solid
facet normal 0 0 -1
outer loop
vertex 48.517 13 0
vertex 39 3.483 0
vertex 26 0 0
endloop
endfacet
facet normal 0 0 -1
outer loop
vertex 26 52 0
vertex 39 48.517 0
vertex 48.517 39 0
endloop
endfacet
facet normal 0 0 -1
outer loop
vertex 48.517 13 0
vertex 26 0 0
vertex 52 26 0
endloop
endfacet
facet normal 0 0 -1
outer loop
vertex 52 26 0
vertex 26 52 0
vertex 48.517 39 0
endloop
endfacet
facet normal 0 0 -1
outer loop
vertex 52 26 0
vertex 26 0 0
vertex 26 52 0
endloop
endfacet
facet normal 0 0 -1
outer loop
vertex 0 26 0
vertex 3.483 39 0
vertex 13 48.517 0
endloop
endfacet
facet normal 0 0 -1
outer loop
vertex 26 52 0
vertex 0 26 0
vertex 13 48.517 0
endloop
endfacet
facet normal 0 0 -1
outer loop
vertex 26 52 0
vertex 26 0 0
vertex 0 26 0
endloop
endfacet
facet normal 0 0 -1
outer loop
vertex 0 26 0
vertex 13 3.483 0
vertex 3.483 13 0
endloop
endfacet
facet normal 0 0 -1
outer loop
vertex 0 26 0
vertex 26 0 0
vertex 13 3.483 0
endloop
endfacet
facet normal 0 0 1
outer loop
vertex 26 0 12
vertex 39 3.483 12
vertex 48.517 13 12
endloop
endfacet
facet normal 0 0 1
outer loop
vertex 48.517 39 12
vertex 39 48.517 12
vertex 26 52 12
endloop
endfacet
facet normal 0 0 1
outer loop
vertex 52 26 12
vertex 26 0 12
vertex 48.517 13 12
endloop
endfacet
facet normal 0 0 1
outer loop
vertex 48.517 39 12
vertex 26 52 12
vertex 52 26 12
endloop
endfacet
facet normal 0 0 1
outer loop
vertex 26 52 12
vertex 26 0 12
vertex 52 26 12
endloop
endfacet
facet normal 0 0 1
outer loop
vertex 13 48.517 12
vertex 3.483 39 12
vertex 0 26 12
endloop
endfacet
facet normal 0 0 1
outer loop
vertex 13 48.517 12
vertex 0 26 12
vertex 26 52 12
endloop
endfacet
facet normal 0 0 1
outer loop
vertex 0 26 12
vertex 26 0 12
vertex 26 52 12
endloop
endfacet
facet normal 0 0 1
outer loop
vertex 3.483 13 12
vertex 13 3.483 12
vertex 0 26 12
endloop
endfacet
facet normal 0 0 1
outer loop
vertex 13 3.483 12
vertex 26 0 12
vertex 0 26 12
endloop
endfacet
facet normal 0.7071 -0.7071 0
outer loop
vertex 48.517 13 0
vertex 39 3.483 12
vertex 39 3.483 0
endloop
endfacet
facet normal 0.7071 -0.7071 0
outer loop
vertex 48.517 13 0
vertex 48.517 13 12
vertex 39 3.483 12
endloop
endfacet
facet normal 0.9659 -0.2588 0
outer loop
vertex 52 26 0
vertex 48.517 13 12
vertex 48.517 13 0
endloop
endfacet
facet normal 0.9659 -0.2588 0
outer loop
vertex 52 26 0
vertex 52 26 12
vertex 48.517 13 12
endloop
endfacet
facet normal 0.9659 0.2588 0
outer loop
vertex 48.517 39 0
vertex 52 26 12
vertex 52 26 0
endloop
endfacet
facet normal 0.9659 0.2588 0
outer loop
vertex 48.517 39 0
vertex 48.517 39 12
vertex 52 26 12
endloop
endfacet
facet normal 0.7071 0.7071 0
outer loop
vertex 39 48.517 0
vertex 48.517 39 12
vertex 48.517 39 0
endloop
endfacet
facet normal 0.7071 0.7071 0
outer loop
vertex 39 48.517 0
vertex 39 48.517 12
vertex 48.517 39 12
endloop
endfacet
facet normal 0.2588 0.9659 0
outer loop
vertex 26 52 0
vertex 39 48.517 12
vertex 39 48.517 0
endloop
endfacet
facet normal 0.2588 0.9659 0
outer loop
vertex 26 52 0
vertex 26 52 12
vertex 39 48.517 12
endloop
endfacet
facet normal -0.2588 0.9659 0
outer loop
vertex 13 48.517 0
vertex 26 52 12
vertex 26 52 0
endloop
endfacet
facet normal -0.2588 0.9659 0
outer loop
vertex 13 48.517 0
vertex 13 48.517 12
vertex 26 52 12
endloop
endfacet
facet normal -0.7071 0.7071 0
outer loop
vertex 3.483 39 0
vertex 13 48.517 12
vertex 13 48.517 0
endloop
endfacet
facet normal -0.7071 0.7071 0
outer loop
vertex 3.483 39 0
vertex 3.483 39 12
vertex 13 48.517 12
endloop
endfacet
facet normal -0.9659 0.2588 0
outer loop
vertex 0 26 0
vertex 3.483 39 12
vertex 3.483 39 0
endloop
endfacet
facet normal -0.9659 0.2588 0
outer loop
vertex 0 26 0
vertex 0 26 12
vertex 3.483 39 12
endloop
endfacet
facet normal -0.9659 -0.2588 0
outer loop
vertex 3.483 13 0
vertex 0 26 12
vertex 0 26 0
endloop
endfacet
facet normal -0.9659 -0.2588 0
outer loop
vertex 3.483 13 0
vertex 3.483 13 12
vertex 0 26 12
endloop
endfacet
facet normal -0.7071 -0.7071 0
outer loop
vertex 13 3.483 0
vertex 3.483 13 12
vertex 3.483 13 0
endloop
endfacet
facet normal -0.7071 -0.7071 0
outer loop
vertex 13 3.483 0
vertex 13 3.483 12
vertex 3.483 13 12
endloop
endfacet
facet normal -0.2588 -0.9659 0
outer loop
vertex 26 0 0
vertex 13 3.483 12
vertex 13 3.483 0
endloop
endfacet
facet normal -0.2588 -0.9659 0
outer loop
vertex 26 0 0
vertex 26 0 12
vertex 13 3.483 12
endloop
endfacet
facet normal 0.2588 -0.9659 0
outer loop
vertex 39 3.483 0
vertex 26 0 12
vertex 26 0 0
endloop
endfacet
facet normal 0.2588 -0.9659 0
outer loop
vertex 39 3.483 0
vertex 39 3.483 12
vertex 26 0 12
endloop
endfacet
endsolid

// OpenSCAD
$fn = 32;

// ----------------------------------------------------------------------
// Eccentric disc: egg, 12 mm thick
// ----------------------------------------------------------------------

// --- parameters (mm) ---
profile_height = 12;      // extrusion height
profile_points = 12;      // points of the closed outline

profile = [[0, 26], [3.483, 13], [13, 3.483], [26, 0], [39, 3.483], [48.517, 13], [52, 26], [48.517, 39], [39, 48.517], [26, 52], [13, 48.517], [3.483, 39]];  // single closed polygon, 12 points, counter clockwise

// --- the one profile operation ---
linear_extrude(height = profile_height) polygon(points = profile);
